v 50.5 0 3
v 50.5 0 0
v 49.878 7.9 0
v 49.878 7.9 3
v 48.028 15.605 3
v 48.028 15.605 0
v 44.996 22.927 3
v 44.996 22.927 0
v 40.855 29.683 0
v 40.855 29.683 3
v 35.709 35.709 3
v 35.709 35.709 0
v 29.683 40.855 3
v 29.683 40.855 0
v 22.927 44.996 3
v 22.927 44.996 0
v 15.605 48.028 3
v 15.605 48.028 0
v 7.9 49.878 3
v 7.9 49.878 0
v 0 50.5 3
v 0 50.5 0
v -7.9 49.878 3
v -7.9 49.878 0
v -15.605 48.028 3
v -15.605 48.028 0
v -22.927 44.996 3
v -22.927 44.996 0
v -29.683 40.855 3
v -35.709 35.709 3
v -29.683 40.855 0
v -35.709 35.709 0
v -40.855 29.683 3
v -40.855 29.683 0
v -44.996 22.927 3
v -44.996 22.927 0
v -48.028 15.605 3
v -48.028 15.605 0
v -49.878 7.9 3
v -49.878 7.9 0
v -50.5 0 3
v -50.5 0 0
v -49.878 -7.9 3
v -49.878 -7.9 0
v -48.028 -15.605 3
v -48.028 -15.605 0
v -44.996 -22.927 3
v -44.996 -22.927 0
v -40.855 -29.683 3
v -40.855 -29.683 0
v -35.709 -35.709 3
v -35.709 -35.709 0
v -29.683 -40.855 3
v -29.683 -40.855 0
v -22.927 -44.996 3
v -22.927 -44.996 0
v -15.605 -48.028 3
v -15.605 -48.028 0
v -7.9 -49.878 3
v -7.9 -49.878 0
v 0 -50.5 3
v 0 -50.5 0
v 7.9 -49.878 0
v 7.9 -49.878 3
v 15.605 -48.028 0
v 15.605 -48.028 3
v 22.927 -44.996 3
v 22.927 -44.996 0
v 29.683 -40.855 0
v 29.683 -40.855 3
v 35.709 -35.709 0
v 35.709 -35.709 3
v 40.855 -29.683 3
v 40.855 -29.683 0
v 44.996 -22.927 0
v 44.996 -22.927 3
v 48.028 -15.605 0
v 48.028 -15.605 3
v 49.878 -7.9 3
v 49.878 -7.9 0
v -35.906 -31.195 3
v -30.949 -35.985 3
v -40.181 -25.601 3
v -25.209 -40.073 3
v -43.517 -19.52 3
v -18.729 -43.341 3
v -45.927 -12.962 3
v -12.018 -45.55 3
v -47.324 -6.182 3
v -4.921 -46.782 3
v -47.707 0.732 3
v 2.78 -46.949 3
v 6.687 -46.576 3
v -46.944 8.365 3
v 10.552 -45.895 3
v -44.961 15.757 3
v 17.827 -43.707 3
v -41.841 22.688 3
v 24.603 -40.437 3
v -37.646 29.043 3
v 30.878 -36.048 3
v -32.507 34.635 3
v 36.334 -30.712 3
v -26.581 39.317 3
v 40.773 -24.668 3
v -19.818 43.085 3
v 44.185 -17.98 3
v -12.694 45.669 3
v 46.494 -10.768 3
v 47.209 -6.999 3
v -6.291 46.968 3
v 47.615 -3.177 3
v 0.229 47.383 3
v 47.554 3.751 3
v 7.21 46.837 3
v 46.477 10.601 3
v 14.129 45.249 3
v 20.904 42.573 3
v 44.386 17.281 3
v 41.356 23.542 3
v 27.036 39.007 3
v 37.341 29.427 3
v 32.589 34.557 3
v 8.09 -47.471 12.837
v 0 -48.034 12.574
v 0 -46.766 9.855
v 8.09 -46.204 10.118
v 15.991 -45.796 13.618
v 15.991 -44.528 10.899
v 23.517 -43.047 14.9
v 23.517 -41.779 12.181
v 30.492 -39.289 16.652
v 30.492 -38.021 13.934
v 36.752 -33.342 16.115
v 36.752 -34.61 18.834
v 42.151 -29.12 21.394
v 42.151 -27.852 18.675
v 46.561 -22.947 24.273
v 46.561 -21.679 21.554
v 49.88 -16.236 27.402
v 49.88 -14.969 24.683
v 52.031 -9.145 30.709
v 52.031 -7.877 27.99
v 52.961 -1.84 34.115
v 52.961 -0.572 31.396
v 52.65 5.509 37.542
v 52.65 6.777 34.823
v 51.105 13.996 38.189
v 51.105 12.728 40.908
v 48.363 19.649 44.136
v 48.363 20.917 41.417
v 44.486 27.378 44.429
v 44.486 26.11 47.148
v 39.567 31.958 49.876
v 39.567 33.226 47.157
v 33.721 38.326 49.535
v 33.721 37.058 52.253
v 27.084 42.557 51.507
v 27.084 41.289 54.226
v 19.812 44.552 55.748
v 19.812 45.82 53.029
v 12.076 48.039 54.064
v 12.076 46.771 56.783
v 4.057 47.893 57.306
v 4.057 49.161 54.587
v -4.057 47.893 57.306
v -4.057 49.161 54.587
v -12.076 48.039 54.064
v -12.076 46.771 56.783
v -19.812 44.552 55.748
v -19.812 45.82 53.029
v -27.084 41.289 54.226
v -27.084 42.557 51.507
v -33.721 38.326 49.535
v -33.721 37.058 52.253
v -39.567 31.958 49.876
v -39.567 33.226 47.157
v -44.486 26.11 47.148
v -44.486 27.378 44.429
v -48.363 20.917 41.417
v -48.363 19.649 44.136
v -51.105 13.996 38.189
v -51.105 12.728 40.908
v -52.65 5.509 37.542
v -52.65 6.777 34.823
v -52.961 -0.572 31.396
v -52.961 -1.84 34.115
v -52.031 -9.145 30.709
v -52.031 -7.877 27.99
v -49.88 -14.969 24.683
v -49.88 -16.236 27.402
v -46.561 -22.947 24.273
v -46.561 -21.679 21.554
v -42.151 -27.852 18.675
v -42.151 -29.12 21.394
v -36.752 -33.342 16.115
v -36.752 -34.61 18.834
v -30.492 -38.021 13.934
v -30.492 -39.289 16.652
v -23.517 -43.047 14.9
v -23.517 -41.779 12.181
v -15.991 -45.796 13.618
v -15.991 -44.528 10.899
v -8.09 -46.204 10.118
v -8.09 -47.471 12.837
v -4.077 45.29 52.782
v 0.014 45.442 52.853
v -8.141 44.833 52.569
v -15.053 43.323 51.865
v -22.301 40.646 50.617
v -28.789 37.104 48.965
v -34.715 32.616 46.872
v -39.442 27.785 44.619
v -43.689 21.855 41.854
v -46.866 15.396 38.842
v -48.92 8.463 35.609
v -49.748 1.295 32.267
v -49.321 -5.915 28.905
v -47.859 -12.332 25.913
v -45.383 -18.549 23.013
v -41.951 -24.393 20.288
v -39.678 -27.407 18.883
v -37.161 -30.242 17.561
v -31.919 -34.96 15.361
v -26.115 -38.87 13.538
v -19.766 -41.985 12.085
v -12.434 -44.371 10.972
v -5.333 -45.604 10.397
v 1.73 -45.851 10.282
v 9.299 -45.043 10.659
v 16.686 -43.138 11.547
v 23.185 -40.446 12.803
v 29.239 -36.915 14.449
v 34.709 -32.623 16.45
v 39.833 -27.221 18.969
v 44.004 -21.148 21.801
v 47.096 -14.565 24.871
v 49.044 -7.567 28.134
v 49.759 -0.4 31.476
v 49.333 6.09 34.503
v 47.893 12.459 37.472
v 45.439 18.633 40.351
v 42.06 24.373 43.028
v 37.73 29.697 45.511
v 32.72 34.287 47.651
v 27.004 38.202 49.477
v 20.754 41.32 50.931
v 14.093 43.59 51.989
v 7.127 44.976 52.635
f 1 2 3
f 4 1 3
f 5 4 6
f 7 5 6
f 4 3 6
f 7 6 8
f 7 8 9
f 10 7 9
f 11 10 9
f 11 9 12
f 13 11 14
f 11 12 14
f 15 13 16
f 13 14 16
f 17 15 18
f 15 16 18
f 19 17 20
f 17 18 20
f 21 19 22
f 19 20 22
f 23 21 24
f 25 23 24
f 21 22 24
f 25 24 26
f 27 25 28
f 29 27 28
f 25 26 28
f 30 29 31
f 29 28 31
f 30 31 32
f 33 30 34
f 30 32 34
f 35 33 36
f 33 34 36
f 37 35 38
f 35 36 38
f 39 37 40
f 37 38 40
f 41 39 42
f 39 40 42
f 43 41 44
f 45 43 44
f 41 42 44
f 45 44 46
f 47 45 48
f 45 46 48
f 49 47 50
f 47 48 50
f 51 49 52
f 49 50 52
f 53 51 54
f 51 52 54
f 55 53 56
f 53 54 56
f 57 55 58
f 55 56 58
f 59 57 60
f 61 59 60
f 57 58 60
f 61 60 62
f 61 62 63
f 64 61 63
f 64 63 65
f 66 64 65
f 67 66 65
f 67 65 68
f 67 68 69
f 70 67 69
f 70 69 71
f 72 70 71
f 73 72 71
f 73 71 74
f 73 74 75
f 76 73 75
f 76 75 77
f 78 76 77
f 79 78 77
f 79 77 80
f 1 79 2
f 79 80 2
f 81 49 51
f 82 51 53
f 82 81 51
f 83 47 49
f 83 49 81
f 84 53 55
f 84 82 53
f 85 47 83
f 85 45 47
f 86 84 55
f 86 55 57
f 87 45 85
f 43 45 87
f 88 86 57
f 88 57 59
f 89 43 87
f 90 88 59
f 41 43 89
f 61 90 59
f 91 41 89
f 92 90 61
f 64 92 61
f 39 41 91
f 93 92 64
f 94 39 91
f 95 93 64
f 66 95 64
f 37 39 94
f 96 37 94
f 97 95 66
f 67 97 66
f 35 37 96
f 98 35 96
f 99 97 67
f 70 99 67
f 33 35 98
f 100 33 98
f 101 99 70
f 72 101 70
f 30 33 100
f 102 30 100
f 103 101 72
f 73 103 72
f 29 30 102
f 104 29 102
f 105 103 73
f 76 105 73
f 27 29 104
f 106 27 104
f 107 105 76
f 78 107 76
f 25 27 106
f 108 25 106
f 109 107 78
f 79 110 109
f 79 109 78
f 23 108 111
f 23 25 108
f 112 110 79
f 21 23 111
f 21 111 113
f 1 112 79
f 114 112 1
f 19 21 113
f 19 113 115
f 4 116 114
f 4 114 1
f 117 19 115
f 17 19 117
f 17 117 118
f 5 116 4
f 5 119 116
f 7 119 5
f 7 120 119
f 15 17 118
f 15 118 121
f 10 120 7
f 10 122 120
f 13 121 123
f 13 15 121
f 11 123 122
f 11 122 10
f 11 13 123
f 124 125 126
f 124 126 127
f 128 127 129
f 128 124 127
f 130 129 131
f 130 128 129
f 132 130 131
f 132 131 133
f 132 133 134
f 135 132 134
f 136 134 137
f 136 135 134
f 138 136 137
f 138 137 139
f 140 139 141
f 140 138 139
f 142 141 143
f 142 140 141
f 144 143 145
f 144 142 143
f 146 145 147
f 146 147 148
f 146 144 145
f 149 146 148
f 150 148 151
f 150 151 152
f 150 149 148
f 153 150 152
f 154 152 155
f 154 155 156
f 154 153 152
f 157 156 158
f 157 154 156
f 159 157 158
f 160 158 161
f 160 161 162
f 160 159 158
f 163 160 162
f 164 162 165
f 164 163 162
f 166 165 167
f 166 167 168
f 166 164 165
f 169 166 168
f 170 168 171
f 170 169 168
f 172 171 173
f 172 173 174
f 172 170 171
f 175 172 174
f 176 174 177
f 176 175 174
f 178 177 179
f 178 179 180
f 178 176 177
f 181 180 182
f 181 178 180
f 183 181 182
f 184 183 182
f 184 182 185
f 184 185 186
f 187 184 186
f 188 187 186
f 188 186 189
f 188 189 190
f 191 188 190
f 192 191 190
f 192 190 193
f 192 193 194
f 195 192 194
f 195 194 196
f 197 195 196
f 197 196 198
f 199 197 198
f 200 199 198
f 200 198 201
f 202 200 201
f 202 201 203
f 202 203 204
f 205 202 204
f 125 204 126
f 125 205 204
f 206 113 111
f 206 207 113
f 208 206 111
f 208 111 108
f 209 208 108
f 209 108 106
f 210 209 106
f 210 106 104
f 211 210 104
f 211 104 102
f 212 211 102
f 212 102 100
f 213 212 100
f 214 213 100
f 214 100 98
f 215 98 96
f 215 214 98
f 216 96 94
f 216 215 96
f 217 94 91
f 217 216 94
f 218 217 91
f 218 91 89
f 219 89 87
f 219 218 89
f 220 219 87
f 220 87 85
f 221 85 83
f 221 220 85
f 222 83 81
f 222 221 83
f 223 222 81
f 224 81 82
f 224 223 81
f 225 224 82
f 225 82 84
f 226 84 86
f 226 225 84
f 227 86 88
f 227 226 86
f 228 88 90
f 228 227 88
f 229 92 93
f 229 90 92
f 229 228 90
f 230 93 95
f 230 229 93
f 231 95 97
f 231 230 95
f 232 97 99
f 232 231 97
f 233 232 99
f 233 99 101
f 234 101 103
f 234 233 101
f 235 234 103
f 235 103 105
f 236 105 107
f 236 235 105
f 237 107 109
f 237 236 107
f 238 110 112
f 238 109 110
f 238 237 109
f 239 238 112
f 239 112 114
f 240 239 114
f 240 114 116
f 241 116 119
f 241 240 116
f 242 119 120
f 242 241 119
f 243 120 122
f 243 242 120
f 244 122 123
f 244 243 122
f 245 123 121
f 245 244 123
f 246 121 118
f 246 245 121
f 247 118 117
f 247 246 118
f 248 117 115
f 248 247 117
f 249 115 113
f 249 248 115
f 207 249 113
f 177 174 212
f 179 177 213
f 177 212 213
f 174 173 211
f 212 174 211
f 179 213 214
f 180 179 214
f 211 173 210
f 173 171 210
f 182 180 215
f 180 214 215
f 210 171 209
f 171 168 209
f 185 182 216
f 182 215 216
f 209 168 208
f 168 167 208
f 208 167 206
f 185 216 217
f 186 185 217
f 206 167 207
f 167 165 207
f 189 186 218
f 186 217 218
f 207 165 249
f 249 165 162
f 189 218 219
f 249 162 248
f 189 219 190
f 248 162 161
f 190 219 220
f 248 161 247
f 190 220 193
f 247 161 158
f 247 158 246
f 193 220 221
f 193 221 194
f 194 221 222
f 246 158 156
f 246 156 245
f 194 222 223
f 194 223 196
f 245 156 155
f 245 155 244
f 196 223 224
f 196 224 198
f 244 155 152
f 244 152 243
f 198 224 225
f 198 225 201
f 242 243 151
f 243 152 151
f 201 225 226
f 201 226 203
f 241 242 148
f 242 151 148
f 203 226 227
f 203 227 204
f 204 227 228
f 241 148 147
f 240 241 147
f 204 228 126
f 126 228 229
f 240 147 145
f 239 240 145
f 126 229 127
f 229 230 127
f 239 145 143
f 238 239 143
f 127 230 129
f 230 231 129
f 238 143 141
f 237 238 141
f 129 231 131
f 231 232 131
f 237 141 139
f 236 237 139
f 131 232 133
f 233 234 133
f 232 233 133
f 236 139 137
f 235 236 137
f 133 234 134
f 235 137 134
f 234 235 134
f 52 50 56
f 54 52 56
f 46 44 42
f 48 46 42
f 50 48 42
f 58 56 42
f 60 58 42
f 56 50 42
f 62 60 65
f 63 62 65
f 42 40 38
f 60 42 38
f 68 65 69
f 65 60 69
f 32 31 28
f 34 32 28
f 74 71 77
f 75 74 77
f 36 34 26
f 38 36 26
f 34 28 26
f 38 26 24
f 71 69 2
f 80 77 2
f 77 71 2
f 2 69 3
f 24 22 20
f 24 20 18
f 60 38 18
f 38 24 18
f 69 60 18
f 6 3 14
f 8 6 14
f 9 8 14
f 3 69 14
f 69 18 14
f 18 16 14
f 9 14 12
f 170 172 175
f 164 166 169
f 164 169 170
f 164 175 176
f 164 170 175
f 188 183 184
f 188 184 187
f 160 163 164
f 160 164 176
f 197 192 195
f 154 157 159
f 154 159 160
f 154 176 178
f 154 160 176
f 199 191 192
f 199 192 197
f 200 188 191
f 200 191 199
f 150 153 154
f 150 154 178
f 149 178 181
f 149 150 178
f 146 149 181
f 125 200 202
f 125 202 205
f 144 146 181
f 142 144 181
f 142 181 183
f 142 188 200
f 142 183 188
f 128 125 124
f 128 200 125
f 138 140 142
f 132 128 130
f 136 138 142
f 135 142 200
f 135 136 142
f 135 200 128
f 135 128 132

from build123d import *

# Parameters (mm, degrees)
SKETCH3_5_R         = 53
BOSS_EXTRUDE1_DEPTH = 3
SKETCH1_4_R         = 50.5
BOSS_EXTRUDE2_DEPTH = 3


with BuildPart() as part:
    # Loft1: read off the stored shape, not the designer's step
    # Loft1: loft between two sections, ruled curve by curve
    loft1_from = [
        Edge.make_bspline([(0.241544596, 47.499385851, 0), (-1.737596481, 47.509450209, 0), (-3.842288399, 47.39739319, 0), (-8.289353956, 46.8248083, 0), (-10.632369605, 46.363999982, 0), (-15.503520848, 44.970085825, 0), (-18.032309665, 44.036212824, 0), (-23.162128099, 41.567632284, 0), (-25.763433471, 40.031528494, 0), (-30.849358196, 36.257342383, 0), (-33.333264415, 34.017445551, 0), (-36.775944803, 30.112965039, 0), (-37.87581218, 28.721489593, 0), (-39.944194911, 25.767467971, 0), (-40.912622225, 24.204899544, 0), (-42.682487304, 20.926659955, 0), (-43.4838255, 19.210998711, 0), (-44.887193549, 15.653926246, 0), (-45.489126325, 13.81256268, 0), (-46.467691985, 10.039975263, 0), (-46.844246907, 8.108835207, 0), (-47.355083559, 4.19913537, 0), (-47.489321493, 2.220685673, 0), (-47.509450209, -1.737596481, 0), (-47.395340382, -3.71730908, 0), (-46.924292451, -7.632002012, 0), (-46.56739702, -9.56687182, 0), (-45.627249815, -13.349216305, 0), (-45.044075144, -15.196606398, 0), (-43.676955696, -18.767767387, 0), (-42.893107505, -20.491489645, 0), (-41.156674204, -23.787559516, 0), (-40.204188557, -25.359896199, 0), (-38.165955692, -28.334800844, 0), (-37.080296735, -29.737390161, 0), (-33.677503614, -33.676681379, 0), (-31.216505982, -35.941724111, 0), (-26.169228392, -39.767439736, 0), (-23.583679985, -41.329919793, 0), (-18.47923273, -43.850543776, 0), (-15.96007234, -44.810086685, 0), (-11.103349361, -46.253469175, 0), (-8.765141384, -46.738082523, 0), (-4.324129102, -47.3558652, 0), (-2.220685673, -47.489321493, 0), (1.737596481, -47.509450209, 0), (3.842288399, -47.39739319, 0), (8.289353956, -46.8248083, 0), (10.632369605, -46.363999982, 0), (15.503520848, -44.970085825, 0), (18.032309665, -44.036212824, 0), (23.162128099, -41.567632284, 0), (25.763433471, -40.031528494, 0), (30.849358196, -36.257342383, 0), (33.333264415, -34.017445551, 0), (36.775944803, -30.112965039, 0), (37.87581218, -28.721489593, 0), (39.944194911, -25.767467971, 0), (40.912622225, -24.204899544, 0), (42.682487304, -20.926659955, 0), (43.4838255, -19.210998711, 0), (44.887193549, -15.653926246, 0), (45.489126325, -13.81256268, 0), (46.467691985, -10.039975263, 0), (46.844246907, -8.108835207, 0), (47.355083559, -4.19913537, 0), (47.489321493, -2.220685673, 0), (47.509450209, 1.737596481, 0), (47.395340382, 3.71730908, 0), (46.924292451, 7.632002012, 0), (46.56739702, 9.56687182, 0), (45.627249815, 13.349216305, 0), (45.044075144, 15.196606398, 0), (43.676955696, 18.767767387, 0), (42.893107505, 20.491489645, 0), (41.156674204, 23.787559516, 0), (40.204188557, 25.359896199, 0), (38.165955692, 28.334800844, 0), (37.080296735, 29.737390161, 0), (33.677503614, 33.676681379, 0), (31.216505982, 35.941724111, 0), (26.169228392, 39.767439736, 0), (23.583679985, 41.329919793, 0), (18.47923273, 43.850543776, 0), (15.96007234, 44.810086685, 0), (11.103349361, 46.253469175, 0), (8.765141384, 46.738082523, 0), (4.324129102, 47.3558652, 0), (2.220685673, 47.489321493, 0), (0.241544596, 47.499385851, 0)], [0, 0, 0, 0, 0.03125, 0.03125, 0.0625, 0.0625, 0.09375, 0.09375, 0.125, 0.125, 0.15625, 0.15625, 0.171875, 0.171875, 0.1875, 0.1875, 0.203125, 0.203125, 0.21875, 0.21875, 0.234375, 0.234375, 0.25, 0.25, 0.265625, 0.265625, 0.28125, 0.28125, 0.296875, 0.296875, 0.3125, 0.3125, 0.328125, 0.328125, 0.34375, 0.34375, 0.375, 0.375, 0.40625, 0.40625, 0.4375, 0.4375, 0.46875, 0.46875, 0.5, 0.5, 0.53125, 0.53125, 0.5625, 0.5625, 0.59375, 0.59375, 0.625, 0.625, 0.65625, 0.65625, 0.671875, 0.671875, 0.6875, 0.6875, 0.703125, 0.703125, 0.71875, 0.71875, 0.734375, 0.734375, 0.75, 0.75, 0.765625, 0.765625, 0.78125, 0.78125, 0.796875, 0.796875, 0.8125, 0.8125, 0.828125, 0.828125, 0.84375, 0.84375, 0.875, 0.875, 0.90625, 0.90625, 0.9375, 0.9375, 0.96875, 0.96875, 1, 1, 1, 1], 3),
    ]
    loft1_to = [
        Edge.make_bspline([(-0.000258413, 45.315389351, 56.103987448), (-2.083591746, 45.315379593, 56.103982898), (-4.298427792, 45.198256849, 56.049367665), (-8.976420743, 44.630417387, 55.784579776), (-11.440251935, 44.179430006, 55.574280906), (-16.560244217, 42.825986395, 54.943159786), (-19.217088791, 41.922795124, 54.521994779), (-24.60360049, 39.542868117, 53.41221659), (-27.3335504, 38.064799025, 52.722981653), (-32.66686306, 34.439542895, 51.032496957), (-35.26946543, 32.290628285, 50.030441618), (-38.872371472, 28.54905177, 48.285715835), (-40.022655762, 27.216248807, 47.664219607), (-42.184044209, 24.388079988, 46.345422828), (-43.195055576, 22.892693332, 45.648112578), (-45.040481753, 19.756671584, 44.185761621), (-45.874791809, 18.116046437, 43.420725551), (-47.332942587, 14.715799072, 41.835164165), (-47.956681379, 12.956222787, 41.014660268), (-48.966522761, 9.35243798, 39.334187814), (-49.352543738, 7.508309779, 38.474256711), (-49.869310496, 3.775991683, 36.7338482), (-50.000010767, 1.887907021, 35.853419864), (-49.999989232, -1.888375425, 34.09251044), (-49.869267427, -3.776458861, 33.212082674), (-49.352458103, -7.508772116, 31.47167642), (-48.966416093, -9.352896701, 30.611747004), (-47.95653361, -12.956672047, 28.931278962), (-47.332774749, -14.716242489, 28.11077779), (-45.874585192, -18.116476194, 26.525222773), (-45.040256424, -19.757093525, 25.760190348), (-43.194794481, -22.893097985, 24.297847452), (-42.183766059, -24.388475169, 23.60054162), (-40.022345356, -27.21662374, 22.281754282), (-38.872045866, -28.549415928, 21.660263079), (-35.269097151, -32.29095869, 19.915553035), (-32.666470272, -34.439848919, 18.913509065), (-27.333116266, -38.065055085, 17.223047667), (-24.603149499, -39.543098603, 16.533824656), (-19.216610657, -41.922975149, 15.424069997), (-16.559755782, -42.82614153, 15.002916597), (-11.439748065, -44.179537177, 14.371817842), (-8.975911729, -44.630501476, 14.161529736), (-4.297912302, -45.198297114, 13.896762282), (-2.08307492, -45.31539911, 13.842156724), (2.083591746, -45.315379593, 13.842165825), (4.298427792, -45.198256849, 13.896781058), (8.976420743, -44.630417387, 14.161568947), (11.440251935, -44.179430006, 14.371867817), (16.560244217, -42.825986395, 15.002988937), (19.217088791, -41.922795124, 15.424153944), (24.60360049, -39.542868117, 16.533932133), (27.3335504, -38.064799025, 17.22316707), (32.66686306, -34.439542895, 18.913651766), (35.26946543, -32.290628285, 19.915707106), (38.872371472, -28.54905177, 21.660432888), (40.022655762, -27.216248807, 22.281929117), (42.184044209, -24.388079988, 23.600725896), (43.195055576, -22.892693332, 24.298036145), (45.040481753, -19.756671584, 25.760387102), (45.874791809, -18.116046437, 26.525423172), (47.332942587, -14.715799072, 28.110984559), (47.956681379, -12.956222787, 28.931488455), (48.966522761, -9.35243798, 30.611960909), (49.352543738, -7.508309779, 31.471892012), (49.869310496, -3.775991683, 33.212300523), (50.000010767, -1.887907021, 34.09272886), (49.999989232, 1.888375425, 35.853638284), (49.869267427, 3.776458861, 36.734066049), (49.352458103, 7.508772116, 38.474472303), (48.966416093, 9.352896701, 39.334401719), (47.95653361, 12.956672047, 41.014869761), (47.332774749, 14.716242489, 41.835370933), (45.874585192, 18.116476194, 43.42092595), (45.040256424, 19.757093525, 44.185958375), (43.194794481, 22.893097985, 45.648301271), (42.183766059, 24.388475169, 46.345607104), (40.022345356, 27.21662374, 47.664394441), (38.872045866, 28.549415928, 48.285885645), (35.269097151, 32.29095869, 50.030595688), (32.666470272, 34.439848919, 51.032639658), (27.333116266, 38.065055085, 52.723101056), (24.603149499, 39.543098603, 53.412324067), (19.216610657, 41.922975149, 54.522078726), (16.559755782, 42.82614153, 54.943232126), (11.439748065, 44.179537177, 55.574330881), (8.975911729, 44.630501476, 55.784618987), (4.297912302, 45.198297114, 56.049386442), (2.08307492, 45.31539911, 56.103991999), (-0.000258413, 45.315389351, 56.103987448)], [0, 0, 0, 0, 0.03125, 0.03125, 0.0625, 0.0625, 0.09375, 0.09375, 0.125, 0.125, 0.15625, 0.15625, 0.171875, 0.171875, 0.1875, 0.1875, 0.203125, 0.203125, 0.21875, 0.21875, 0.234375, 0.234375, 0.25, 0.25, 0.265625, 0.265625, 0.28125, 0.28125, 0.296875, 0.296875, 0.3125, 0.3125, 0.328125, 0.328125, 0.34375, 0.34375, 0.375, 0.375, 0.40625, 0.40625, 0.4375, 0.4375, 0.46875, 0.46875, 0.5, 0.5, 0.53125, 0.53125, 0.5625, 0.5625, 0.59375, 0.59375, 0.625, 0.625, 0.65625, 0.65625, 0.671875, 0.671875, 0.6875, 0.6875, 0.703125, 0.703125, 0.71875, 0.71875, 0.734375, 0.734375, 0.75, 0.75, 0.765625, 0.765625, 0.78125, 0.78125, 0.796875, 0.796875, 0.8125, 0.8125, 0.828125, 0.828125, 0.84375, 0.84375, 0.875, 0.875, 0.90625, 0.90625, 0.9375, 0.9375, 0.96875, 0.96875, 1, 1, 1, 1], 3),
    ]
    loft1 = Solid(Shell([*[Face.make_surface_from_curves(loft1_from[k], loft1_to[k]) for k in range(1)], Face(Wire(loft1_from)), Face(Wire(loft1_to))]))
    add(loft1)

    # Sketch3<5> → Boss-Extrude1 (add)
    with BuildSketch(Plane(origin=(0, -13.395464637, 28.726666617), x_dir=(1, 0, 0), z_dir=(0, -0.4226182617407003, 0.9063077870366496))):
        with Locations(Location((0, 14.780259894, 0), (0, 0, 270))):
            Circle(SKETCH3_5_R)
    extrude(amount=-BOSS_EXTRUDE1_DEPTH)

    # Sketch1<4> → Boss-Extrude2 (add)
    with BuildSketch(Plane.XY):
        Circle(SKETCH1_4_R)
    extrude(amount=BOSS_EXTRUDE2_DEPTH)


solid = part.part
